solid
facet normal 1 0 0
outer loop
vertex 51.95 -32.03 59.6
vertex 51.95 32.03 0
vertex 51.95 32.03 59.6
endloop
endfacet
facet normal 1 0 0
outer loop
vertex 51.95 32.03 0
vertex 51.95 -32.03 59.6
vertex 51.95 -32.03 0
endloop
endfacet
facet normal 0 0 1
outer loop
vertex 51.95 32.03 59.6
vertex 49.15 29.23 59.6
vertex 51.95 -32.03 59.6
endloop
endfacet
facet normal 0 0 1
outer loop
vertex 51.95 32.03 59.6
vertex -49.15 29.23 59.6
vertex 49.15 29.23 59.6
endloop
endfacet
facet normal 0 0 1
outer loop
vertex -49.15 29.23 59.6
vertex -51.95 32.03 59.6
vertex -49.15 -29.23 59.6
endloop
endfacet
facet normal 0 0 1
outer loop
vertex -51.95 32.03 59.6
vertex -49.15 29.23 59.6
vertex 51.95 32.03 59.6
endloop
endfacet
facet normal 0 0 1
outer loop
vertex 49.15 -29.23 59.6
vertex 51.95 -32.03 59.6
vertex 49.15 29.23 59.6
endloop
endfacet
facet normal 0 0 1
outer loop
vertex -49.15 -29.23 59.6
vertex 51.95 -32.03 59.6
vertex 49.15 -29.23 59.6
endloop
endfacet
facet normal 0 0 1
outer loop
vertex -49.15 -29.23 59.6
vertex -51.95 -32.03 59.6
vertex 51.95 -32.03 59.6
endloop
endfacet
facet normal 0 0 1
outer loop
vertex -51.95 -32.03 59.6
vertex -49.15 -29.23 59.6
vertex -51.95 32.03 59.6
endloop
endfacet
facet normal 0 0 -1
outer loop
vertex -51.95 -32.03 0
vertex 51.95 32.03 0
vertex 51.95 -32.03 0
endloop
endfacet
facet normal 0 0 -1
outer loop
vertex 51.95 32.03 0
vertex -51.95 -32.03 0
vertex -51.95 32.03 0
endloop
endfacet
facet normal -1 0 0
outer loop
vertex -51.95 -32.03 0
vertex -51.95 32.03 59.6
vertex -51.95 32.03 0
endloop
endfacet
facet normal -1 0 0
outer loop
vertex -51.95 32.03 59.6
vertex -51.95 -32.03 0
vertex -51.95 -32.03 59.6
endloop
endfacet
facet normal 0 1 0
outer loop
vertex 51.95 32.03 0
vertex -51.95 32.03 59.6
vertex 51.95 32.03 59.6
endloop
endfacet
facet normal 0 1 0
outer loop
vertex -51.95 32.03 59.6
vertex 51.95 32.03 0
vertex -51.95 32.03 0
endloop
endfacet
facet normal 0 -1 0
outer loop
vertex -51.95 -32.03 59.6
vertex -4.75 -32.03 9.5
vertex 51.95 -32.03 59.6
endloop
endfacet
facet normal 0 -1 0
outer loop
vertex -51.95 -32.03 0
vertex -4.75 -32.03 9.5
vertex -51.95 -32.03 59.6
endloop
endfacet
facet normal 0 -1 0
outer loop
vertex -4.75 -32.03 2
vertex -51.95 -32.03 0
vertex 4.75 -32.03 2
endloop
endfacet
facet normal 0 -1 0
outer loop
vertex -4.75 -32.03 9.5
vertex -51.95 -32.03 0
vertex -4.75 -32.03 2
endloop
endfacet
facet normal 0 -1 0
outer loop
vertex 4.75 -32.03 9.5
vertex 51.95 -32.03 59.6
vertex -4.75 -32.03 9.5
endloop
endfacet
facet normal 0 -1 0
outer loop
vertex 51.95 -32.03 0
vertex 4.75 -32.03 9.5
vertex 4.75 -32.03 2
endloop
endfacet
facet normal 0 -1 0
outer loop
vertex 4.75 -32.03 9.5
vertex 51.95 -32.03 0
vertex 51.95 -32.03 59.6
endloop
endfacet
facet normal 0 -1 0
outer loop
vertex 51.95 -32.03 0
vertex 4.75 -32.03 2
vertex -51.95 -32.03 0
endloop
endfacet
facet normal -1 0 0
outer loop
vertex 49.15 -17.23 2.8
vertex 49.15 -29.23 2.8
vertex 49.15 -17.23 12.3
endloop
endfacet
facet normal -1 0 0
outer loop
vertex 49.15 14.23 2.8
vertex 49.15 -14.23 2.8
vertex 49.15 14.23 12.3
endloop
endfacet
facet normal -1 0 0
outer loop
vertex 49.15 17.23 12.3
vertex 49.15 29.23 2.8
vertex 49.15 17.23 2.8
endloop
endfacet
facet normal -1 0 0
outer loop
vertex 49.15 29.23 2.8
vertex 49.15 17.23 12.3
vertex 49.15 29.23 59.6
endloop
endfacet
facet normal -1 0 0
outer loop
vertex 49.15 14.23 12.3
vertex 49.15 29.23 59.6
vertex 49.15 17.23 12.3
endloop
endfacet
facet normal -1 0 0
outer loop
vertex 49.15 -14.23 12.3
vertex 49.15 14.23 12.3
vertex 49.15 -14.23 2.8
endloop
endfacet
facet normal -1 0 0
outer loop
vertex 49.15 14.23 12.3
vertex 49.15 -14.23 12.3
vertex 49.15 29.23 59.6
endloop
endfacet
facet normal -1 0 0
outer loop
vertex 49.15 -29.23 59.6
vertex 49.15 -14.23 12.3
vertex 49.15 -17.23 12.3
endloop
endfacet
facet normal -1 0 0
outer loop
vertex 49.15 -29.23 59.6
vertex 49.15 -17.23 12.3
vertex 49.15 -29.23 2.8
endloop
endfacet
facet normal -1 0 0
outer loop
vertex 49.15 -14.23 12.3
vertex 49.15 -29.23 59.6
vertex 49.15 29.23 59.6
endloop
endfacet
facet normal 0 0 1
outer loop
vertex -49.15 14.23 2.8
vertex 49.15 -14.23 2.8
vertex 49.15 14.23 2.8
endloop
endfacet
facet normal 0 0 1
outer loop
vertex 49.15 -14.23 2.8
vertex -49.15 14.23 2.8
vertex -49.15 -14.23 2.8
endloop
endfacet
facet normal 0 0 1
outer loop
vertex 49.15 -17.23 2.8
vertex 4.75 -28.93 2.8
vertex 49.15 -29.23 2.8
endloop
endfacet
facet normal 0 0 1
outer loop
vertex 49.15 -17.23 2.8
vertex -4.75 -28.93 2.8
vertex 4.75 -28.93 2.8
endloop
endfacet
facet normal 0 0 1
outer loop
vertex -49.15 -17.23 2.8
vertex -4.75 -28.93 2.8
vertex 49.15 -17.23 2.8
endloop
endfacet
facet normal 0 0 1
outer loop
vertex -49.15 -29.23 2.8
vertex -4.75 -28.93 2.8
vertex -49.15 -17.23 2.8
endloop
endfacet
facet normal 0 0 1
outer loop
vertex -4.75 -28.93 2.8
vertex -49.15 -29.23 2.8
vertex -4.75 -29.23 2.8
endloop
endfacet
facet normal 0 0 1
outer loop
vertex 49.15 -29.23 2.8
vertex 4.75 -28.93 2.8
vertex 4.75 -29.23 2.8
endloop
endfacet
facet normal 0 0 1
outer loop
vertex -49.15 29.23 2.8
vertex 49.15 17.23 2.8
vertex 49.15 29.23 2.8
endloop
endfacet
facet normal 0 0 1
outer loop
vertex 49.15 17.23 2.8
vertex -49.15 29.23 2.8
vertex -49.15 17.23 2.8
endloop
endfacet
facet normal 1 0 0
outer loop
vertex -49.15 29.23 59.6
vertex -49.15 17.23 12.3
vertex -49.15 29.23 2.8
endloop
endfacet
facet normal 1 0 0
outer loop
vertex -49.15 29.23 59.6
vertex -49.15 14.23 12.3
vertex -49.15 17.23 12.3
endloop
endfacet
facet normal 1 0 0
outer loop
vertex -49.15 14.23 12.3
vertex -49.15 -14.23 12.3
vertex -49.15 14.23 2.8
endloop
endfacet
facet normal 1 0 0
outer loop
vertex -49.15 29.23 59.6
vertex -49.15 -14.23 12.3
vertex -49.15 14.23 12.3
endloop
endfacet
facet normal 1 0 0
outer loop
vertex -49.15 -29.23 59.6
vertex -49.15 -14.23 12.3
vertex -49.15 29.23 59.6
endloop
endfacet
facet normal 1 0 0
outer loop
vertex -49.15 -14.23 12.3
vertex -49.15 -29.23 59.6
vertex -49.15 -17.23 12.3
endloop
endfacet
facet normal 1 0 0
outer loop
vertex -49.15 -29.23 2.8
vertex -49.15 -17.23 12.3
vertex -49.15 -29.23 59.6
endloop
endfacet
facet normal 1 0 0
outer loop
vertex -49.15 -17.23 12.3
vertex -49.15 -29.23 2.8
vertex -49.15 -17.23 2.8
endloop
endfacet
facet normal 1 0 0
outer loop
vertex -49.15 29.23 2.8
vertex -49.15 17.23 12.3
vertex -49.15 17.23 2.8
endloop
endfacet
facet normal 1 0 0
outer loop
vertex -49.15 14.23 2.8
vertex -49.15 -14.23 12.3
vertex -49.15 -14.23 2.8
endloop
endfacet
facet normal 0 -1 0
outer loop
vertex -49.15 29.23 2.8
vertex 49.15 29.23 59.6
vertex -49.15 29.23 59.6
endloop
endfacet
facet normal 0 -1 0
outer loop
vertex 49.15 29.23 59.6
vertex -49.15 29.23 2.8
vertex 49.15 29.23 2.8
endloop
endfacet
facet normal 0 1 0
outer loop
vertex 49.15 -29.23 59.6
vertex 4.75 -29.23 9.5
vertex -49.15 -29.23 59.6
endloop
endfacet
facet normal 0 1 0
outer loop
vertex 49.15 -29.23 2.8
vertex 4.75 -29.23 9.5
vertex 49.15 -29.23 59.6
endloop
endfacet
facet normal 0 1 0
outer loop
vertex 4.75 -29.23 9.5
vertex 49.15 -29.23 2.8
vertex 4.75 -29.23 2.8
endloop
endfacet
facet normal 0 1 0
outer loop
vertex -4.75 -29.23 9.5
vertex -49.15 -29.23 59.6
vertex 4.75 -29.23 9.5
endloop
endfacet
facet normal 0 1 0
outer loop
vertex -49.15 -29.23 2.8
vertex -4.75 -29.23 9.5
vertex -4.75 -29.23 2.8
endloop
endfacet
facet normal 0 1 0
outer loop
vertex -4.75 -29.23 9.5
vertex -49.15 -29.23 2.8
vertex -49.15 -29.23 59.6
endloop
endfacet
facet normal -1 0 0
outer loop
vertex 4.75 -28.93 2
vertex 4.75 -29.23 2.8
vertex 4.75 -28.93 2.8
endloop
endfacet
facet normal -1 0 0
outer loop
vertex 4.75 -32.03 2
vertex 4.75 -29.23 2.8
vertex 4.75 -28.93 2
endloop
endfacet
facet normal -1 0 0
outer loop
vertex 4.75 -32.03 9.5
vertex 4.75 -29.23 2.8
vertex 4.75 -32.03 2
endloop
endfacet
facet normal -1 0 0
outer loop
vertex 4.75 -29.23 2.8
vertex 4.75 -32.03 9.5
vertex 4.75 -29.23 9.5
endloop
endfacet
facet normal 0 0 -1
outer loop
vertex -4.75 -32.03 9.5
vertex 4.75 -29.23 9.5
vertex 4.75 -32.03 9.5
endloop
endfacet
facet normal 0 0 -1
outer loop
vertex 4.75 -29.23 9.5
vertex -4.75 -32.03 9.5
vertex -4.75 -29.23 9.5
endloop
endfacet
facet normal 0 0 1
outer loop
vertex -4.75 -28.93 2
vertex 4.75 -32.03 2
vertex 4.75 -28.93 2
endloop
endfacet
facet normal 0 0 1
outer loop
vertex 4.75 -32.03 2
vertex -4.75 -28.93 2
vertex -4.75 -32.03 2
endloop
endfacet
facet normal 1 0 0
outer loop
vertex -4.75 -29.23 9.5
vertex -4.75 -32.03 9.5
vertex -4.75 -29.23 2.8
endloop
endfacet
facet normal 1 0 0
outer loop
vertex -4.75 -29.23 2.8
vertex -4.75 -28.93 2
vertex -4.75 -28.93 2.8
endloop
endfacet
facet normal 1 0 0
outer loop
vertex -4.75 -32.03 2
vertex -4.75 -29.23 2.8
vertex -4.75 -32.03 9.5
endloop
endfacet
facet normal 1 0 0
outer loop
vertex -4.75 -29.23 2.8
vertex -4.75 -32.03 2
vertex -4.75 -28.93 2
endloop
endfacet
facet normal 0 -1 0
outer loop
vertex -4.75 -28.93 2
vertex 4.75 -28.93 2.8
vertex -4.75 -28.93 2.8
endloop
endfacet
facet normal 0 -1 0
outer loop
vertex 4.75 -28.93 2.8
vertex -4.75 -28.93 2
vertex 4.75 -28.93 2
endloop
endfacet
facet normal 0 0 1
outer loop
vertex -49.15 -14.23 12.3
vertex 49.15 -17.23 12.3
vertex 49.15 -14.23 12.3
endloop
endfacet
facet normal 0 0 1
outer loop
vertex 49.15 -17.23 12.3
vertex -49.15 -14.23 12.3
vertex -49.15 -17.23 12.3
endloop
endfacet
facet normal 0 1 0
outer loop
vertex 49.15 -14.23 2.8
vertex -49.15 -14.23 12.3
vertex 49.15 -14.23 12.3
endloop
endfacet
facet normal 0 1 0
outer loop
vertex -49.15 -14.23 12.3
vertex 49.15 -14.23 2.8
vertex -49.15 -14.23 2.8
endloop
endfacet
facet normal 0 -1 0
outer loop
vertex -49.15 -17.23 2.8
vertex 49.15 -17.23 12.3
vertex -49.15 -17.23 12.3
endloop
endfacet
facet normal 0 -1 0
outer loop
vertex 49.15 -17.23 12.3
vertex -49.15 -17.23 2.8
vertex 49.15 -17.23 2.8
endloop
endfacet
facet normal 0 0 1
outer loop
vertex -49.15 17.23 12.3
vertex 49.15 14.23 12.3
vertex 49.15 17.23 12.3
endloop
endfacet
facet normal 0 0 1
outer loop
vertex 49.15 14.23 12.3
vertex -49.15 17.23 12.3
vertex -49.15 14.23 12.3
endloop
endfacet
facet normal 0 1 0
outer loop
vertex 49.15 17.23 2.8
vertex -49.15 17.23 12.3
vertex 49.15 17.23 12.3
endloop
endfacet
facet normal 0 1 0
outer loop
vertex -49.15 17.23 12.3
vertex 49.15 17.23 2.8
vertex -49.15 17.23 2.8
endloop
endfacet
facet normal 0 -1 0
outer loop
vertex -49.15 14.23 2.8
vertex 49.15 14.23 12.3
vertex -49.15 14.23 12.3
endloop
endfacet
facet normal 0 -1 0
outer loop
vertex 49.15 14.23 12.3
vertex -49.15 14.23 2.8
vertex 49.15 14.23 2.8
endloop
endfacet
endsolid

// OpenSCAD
// Vacuum battery enclosure V2 - rail-retained tray, no posts
// Coordinate convention: X=length, Y=width, Z=height.
// The DC jack opening is placed on a short side wall: the -Y wall.

part = "case";
$fn = 48;

battery = [96.7, 56.86, 55.2];
clearance = 0.8;
wall = 2.8;
floor = 2.8;

inner = [battery[0] + 2 * clearance, battery[1] + 2 * clearance, battery[2] + 2 * clearance];
outer = [inner[0] + 2 * wall, inner[1] + 2 * wall, inner[2] + floor];

// DC jack opening requirements: 9.5 mm wide x 7.5 mm high,
// with the bottom of the opening 2 mm above the outside bottom.
dc_jack_opening = [9.5, wall + 0.4, 7.5];
dc_jack_bottom_from_outside = 2;
dc_jack_z = dc_jack_bottom_from_outside;

// Rail requirements: exactly two rails, 9.5 mm tall, inset 12 mm from each side,
// running the usable internal length of the case.
rail_count = 2;
rail_height = 9.5;
rail_side_inset = 12;
rail_width = 3.0;
rail_length = inner[0];
rail_y_positions = [
  -inner[1] / 2 + rail_side_inset,
   inner[1] / 2 - rail_side_inset - rail_width
];

module rails() {
  for (i = [0 : rail_count - 1]) {
    translate([-inner[0] / 2, rail_y_positions[i], floor])
      cube([rail_length, rail_width, rail_height]);
  }
}

module hollow_shell() {
  difference() {
    translate([-outer[0] / 2, -outer[1] / 2, 0])
      cube(outer);

    translate([-inner[0] / 2, -inner[1] / 2, floor])
      cube([inner[0], inner[1], inner[2] + 0.2]);

    // DC jack opening centered on the short -Y side wall.
    translate([-dc_jack_opening[0] / 2, -outer[1] / 2 - 0.1, dc_jack_z])
      cube(dc_jack_opening);
  }
}

module case_body() {
  union() {
    hollow_shell();
    rails();
  }
}

if (part == "case") {
  case_body();
}
